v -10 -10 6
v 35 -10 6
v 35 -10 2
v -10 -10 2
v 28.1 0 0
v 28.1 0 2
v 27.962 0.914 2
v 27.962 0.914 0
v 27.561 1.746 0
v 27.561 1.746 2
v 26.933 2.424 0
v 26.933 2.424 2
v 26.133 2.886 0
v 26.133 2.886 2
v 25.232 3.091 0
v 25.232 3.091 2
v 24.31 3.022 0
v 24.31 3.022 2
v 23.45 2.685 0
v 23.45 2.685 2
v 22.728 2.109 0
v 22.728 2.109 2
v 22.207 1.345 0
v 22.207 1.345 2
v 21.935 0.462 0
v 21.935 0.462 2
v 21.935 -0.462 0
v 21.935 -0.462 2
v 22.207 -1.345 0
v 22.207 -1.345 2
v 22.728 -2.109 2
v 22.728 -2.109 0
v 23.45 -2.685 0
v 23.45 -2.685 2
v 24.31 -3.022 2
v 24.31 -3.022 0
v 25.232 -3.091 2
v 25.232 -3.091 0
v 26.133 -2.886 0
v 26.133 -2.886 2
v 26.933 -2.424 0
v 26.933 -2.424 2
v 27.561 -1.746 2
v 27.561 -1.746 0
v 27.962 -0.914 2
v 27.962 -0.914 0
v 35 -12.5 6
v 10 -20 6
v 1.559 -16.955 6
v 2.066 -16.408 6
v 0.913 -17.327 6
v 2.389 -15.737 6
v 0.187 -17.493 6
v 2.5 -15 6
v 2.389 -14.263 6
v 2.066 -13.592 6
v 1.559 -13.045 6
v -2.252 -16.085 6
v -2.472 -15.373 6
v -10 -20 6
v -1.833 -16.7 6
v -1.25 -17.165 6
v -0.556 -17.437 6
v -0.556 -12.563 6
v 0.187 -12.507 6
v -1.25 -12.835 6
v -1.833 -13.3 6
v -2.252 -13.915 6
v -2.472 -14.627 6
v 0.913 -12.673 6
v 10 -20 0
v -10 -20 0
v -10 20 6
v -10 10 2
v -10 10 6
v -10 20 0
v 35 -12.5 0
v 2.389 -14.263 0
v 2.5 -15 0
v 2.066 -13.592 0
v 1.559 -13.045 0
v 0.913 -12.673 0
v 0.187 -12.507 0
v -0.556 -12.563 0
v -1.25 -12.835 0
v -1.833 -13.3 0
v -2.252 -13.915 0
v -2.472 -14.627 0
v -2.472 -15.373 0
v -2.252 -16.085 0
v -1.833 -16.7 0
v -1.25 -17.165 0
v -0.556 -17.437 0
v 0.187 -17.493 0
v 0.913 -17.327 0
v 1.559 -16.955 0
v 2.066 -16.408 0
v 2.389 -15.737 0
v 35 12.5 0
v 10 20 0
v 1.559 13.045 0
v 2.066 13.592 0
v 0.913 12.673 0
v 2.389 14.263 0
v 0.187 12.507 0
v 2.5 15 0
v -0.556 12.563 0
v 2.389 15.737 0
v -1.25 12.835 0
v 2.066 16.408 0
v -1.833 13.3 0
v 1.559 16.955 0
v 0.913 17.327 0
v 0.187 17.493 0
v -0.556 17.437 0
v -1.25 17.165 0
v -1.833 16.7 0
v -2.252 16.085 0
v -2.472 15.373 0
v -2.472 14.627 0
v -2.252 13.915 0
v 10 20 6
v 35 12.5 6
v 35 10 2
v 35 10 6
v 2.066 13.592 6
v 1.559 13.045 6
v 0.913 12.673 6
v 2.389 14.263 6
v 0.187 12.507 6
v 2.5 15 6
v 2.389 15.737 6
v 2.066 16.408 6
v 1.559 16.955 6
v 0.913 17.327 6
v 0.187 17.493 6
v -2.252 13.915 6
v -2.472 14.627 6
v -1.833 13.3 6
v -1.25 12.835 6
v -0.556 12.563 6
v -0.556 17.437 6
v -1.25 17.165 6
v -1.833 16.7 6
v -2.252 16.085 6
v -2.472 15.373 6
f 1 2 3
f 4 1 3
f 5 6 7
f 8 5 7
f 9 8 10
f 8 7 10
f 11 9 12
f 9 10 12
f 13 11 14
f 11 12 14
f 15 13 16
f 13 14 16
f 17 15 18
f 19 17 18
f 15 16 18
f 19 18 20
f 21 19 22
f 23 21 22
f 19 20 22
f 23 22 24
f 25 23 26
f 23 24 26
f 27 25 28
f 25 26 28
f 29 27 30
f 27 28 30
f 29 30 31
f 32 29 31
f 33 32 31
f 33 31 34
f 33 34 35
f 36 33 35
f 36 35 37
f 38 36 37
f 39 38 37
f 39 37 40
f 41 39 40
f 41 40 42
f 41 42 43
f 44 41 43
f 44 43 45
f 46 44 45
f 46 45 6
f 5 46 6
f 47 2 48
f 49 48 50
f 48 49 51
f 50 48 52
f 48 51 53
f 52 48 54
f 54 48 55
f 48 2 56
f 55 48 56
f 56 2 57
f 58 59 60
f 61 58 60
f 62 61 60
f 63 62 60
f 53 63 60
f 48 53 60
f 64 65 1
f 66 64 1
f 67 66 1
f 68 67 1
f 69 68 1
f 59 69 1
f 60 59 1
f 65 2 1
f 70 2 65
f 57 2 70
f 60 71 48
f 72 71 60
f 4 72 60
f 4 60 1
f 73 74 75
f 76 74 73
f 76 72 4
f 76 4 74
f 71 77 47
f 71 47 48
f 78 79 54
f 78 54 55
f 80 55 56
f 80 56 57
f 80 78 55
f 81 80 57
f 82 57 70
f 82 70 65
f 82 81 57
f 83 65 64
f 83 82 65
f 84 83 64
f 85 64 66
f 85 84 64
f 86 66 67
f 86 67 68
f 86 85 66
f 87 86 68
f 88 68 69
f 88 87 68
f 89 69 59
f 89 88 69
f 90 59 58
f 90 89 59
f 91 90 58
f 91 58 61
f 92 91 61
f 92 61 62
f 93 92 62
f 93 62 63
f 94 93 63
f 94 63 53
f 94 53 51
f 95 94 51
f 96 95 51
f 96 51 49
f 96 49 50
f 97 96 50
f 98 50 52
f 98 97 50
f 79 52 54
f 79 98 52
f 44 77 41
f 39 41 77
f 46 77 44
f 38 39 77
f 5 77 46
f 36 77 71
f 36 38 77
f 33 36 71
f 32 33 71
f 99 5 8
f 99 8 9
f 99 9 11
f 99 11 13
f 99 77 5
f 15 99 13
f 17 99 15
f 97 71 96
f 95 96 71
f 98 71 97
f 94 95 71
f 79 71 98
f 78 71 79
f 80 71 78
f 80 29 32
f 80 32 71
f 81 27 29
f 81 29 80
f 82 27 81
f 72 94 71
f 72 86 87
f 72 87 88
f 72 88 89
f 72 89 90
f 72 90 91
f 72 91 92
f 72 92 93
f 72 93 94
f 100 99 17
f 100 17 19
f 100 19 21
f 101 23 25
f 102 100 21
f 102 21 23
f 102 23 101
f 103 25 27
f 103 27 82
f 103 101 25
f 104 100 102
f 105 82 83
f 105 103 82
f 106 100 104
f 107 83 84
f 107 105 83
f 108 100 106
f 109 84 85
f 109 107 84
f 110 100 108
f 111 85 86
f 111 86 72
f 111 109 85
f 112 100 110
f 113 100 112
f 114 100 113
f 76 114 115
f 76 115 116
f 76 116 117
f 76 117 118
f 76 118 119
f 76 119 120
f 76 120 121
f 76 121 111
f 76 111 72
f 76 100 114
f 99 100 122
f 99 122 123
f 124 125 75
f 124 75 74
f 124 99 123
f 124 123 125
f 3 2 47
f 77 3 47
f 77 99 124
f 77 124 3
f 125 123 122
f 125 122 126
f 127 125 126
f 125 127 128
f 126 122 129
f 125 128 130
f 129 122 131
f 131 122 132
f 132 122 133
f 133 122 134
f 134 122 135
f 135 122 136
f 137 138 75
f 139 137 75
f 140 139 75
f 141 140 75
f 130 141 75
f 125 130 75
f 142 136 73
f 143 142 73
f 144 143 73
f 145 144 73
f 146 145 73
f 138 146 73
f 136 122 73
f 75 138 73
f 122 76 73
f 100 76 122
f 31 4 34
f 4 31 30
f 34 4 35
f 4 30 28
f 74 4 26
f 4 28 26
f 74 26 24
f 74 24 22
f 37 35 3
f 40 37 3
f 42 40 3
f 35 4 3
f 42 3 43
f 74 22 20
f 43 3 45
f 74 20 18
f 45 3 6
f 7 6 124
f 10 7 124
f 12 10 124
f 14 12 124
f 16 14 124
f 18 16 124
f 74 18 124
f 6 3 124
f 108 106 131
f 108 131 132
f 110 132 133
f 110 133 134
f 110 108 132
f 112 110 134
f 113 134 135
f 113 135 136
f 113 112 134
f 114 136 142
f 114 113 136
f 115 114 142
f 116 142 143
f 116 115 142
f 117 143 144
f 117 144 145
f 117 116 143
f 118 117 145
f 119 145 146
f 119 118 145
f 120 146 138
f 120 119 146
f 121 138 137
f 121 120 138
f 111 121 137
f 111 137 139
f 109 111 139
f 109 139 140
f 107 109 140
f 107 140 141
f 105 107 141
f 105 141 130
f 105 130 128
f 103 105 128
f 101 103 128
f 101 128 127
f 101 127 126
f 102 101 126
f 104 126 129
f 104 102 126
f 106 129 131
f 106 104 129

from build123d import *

# Parameters (mm, degrees)
SKETCH1_R           = 2.5
BOSS_EXTRUDE1_DEPTH = 6
CUT_EXTRUDE1_REACH  = 51.608
SKETCH2_W           = 4
SKETCH2_H           = 20
CUT_EXTRUDE2_REACH  = 42.509
SKETCH3_R           = 3.1


with BuildPart() as part:
    # Sketch1 → Boss-Extrude1 (new body)
    with BuildSketch(Plane.XY):
        Polygon((10, 20), (35, 12.5), (35, -12.5), (10, -20), (-10, -20), (-10, 20), align=None)
        with Locations((0, -15)):
            Circle(SKETCH1_R, mode=Mode.SUBTRACT)
        with Locations((0, 15)):
            Circle(SKETCH1_R, mode=Mode.SUBTRACT)
    extrude(amount=BOSS_EXTRUDE1_DEPTH)

    # Sketch2 → Cut-Extrude1 (cut, up to next)
    with BuildSketch(Plane(origin=(35, 0, 0), x_dir=(0, 0, -1), z_dir=(1, 0, 0)), mode=Mode.PRIVATE) as cut_extrude1_sk1:
        with Locations((-4, 0)):
            Rectangle(SKETCH2_W, SKETCH2_H)
    cut_extrude1_tool1 = extrude(cut_extrude1_sk1.sketch, amount=-CUT_EXTRUDE1_REACH, mode=Mode.PRIVATE) & part.part
    add(cut_extrude1_tool1.solids().sort_by_distance((35, 0, 4))[0], mode=Mode.SUBTRACT)

    # Sketch3 → Cut-Extrude2 (cut, up to next)
    with BuildSketch(Plane.XY.offset(2), mode=Mode.PRIVATE) as cut_extrude2_sk1:
        with Locations((25, 0)):
            Circle(SKETCH3_R)
    cut_extrude2_tool1 = extrude(cut_extrude2_sk1.sketch, amount=-CUT_EXTRUDE2_REACH, mode=Mode.PRIVATE) & part.part
    add(cut_extrude2_tool1.solids().sort_by_distance((25, 0, 2))[0], mode=Mode.SUBTRACT)


solid = part.part
